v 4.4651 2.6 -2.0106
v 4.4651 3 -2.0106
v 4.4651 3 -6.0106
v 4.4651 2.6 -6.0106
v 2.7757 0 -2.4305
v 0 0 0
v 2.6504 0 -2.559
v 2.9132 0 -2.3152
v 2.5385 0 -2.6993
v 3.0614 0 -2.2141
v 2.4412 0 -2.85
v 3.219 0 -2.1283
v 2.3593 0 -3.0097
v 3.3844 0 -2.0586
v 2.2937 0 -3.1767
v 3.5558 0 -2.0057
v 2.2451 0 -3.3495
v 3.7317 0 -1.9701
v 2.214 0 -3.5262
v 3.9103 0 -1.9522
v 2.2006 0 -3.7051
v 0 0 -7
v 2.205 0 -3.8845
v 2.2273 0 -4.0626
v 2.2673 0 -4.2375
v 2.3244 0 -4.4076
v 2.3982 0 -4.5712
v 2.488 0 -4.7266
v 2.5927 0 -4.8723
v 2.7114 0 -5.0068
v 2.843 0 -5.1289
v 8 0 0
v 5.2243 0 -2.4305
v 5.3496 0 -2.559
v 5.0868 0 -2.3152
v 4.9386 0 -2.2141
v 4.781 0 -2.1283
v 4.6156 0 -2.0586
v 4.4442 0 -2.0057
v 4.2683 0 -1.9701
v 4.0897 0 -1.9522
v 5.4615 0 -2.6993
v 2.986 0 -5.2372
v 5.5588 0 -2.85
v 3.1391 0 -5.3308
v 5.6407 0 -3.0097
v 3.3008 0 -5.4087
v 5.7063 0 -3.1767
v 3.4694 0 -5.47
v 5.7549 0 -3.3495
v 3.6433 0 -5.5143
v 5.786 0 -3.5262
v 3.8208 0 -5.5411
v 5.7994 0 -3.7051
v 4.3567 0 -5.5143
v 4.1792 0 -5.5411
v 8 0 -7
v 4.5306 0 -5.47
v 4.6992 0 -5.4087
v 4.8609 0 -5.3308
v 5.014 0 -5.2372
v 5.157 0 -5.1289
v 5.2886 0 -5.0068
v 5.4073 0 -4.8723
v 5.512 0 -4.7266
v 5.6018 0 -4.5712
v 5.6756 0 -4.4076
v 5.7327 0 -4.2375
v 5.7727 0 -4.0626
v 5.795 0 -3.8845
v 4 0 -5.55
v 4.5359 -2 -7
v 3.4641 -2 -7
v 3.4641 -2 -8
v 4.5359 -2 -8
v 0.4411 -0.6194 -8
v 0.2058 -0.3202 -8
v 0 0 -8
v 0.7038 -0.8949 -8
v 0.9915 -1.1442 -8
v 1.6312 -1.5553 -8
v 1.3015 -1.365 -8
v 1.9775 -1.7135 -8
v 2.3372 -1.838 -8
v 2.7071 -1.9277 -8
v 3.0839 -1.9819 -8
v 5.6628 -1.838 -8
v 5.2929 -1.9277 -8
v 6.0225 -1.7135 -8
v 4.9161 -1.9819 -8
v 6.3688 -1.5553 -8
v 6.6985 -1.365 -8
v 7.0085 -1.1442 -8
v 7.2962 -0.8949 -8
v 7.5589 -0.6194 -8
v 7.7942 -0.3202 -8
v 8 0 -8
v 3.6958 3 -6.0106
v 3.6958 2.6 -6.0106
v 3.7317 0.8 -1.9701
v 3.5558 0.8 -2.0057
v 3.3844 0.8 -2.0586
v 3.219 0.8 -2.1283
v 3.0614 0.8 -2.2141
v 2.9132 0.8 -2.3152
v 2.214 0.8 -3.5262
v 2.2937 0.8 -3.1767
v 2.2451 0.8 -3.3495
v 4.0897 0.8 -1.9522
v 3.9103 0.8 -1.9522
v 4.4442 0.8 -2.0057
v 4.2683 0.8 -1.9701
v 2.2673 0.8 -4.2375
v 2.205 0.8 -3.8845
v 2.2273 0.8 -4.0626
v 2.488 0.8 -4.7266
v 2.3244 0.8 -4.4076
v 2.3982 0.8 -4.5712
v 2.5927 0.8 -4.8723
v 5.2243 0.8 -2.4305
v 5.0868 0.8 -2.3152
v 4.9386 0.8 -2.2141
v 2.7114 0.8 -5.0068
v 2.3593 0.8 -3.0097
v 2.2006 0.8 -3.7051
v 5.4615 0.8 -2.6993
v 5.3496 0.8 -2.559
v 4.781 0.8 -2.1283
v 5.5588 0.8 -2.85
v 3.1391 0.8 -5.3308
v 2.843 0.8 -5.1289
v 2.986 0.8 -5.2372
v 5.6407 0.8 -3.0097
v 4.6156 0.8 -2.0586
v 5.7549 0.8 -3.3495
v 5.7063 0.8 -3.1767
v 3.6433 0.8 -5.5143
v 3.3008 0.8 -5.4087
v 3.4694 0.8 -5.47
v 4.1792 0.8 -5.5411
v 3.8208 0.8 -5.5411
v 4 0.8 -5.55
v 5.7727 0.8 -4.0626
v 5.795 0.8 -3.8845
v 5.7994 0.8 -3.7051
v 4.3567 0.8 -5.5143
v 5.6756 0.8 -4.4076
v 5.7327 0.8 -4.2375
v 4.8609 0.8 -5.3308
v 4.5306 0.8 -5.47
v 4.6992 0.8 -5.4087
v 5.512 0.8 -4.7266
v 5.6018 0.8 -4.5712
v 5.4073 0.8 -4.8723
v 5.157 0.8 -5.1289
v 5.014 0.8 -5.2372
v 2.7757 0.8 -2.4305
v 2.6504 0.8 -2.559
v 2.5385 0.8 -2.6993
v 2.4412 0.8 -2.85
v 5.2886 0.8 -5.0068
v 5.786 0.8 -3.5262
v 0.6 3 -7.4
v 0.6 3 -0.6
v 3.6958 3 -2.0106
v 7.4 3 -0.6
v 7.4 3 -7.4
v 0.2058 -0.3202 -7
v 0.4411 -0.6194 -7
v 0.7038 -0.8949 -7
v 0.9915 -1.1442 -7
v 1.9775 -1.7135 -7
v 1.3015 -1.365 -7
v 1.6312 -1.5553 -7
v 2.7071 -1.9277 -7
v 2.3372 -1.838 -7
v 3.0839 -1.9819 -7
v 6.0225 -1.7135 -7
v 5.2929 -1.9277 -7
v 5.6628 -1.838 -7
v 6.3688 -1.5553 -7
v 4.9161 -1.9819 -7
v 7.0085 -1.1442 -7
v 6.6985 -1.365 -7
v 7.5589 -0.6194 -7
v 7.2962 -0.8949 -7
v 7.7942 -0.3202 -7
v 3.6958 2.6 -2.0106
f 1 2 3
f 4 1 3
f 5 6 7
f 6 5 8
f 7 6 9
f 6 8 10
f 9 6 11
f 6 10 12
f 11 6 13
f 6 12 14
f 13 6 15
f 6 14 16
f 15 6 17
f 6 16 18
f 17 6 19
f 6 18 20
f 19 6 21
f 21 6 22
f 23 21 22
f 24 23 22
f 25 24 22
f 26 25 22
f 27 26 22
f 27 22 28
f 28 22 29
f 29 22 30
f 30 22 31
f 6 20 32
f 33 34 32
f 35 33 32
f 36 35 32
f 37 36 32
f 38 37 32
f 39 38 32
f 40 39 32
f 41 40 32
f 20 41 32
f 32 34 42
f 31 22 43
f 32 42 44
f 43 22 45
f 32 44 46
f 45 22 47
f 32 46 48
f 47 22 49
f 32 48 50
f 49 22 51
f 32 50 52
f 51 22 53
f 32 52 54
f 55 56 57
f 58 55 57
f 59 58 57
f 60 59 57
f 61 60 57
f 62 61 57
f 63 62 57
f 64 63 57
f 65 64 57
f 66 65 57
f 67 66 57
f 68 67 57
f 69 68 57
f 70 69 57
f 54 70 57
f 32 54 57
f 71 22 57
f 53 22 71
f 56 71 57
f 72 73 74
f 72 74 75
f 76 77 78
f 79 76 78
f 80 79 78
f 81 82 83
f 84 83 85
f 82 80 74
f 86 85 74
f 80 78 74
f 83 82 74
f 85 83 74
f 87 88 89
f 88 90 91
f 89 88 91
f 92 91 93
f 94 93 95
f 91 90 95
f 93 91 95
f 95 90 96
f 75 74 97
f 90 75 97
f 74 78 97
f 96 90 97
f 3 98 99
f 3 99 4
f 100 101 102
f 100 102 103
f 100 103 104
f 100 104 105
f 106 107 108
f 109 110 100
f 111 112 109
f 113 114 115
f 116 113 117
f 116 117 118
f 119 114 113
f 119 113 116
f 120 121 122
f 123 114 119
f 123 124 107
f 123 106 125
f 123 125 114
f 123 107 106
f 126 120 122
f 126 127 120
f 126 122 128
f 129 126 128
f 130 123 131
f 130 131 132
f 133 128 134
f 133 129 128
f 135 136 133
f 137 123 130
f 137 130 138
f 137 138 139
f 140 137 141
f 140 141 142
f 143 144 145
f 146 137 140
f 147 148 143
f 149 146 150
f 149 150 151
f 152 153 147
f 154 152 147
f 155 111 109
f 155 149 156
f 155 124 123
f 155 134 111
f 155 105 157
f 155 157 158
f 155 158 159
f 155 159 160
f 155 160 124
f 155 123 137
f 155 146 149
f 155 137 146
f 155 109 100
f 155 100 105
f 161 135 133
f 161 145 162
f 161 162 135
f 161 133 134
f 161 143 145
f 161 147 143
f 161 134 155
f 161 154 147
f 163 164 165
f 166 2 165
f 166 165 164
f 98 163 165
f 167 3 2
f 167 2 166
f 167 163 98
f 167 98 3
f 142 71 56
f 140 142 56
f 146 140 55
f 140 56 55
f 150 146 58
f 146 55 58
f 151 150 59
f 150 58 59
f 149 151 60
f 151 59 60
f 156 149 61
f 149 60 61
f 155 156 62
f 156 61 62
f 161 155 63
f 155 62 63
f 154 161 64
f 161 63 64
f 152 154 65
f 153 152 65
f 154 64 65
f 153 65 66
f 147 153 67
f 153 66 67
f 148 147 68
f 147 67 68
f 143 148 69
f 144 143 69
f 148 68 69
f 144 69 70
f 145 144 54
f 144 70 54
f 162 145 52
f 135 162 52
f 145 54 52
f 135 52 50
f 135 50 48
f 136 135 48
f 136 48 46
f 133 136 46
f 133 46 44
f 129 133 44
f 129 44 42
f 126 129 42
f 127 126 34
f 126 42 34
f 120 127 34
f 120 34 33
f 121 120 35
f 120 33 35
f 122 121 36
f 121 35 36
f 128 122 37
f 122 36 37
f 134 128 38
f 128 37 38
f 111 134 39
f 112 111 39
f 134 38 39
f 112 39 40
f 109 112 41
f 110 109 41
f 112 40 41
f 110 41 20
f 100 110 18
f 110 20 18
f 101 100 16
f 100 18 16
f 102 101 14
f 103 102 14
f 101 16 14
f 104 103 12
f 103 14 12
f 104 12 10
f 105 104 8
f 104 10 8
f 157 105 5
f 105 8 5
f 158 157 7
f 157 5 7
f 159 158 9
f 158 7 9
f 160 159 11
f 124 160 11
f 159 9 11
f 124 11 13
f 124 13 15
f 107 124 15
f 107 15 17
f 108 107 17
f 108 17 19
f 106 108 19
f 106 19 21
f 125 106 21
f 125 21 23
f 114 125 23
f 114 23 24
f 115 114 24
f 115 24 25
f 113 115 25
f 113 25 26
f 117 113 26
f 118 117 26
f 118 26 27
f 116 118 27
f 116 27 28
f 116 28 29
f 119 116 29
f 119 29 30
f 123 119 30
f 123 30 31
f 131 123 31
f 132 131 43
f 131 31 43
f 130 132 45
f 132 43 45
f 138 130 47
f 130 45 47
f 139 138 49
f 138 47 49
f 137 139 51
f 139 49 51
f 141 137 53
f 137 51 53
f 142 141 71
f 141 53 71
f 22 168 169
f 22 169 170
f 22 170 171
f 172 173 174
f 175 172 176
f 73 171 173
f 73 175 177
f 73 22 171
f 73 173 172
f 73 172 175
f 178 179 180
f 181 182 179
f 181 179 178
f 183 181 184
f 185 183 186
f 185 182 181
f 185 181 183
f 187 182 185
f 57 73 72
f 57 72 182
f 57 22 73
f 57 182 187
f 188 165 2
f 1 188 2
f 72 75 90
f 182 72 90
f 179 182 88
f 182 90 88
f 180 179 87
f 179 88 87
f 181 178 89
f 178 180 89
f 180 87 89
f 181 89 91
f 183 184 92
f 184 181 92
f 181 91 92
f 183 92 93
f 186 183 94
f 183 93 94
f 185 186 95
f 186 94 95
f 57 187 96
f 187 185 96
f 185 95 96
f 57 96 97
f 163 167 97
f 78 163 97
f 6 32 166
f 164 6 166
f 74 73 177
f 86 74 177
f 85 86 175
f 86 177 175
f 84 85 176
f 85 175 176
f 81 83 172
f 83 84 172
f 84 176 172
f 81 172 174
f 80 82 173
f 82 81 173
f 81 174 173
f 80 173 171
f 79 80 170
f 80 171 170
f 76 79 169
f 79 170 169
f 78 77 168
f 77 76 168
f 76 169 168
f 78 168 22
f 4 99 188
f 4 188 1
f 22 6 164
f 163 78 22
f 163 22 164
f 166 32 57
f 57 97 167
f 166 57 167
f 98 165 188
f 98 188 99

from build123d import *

# Parameters (mm, degrees)
SKETCH1_W               = 8
SKETCH1_H               = 8
BOSS_EXTRUDE1_DEPTH     = 3
CUT_EXTRUDE1_DEPTH      = 12.704699911
CUT_EXTRUDE1_DEPTH_BACK = 12.704699911
CUT_EXTRUDE2_DEPTH      = 11
SKETCH4_R               = 1.8
CUT_EXTRUDE3_DEPTH      = 0.8
SKETCH5_W               = 8
SKETCH5_H               = 1
BOSS_EXTRUDE2_DEPTH     = 2
FILLET1_R               = 4
SKETCH6_W               = 0.769230769
SKETCH6_H               = 4
CUT_EXTRUDE4_DEPTH      = 0.4


with BuildPart() as part:
    # Sketch1 → Boss-Extrude1 (new body)
    with BuildSketch(Plane(origin=(0, 0, 0), x_dir=(1, 0, 0), z_dir=(0, 1, 0))):
        with Locations((4, 4)):
            Rectangle(SKETCH1_W, SKETCH1_H)
    extrude(amount=BOSS_EXTRUDE1_DEPTH)

    # Sketch2 → Cut-Extrude1 (cut, two sides: drawn at the far end of the back side and taken through both)
    with BuildSketch(Plane.XY.offset(-CUT_EXTRUDE1_DEPTH_BACK)):
        Polygon((0, 0), (0.6, 3), (0, 3), align=None)
        Polygon((8, 0), (7.4, 3), (8, 3), align=None)
    extrude(amount=CUT_EXTRUDE1_DEPTH + CUT_EXTRUDE1_DEPTH_BACK, mode=Mode.SUBTRACT)

    # Sketch3 → Cut-Extrude2 (cut)
    with BuildSketch(Plane(origin=(0, 0, 0), x_dir=(0, 0, -1), z_dir=(1, 0, 0))):
        Polygon((0, 0), (0.6, 3), (0, 3), align=None)
        Polygon((8, 3), (7.4, 3), (8, 0), align=None)
    extrude(amount=CUT_EXTRUDE2_DEPTH, mode=Mode.SUBTRACT)

    # Sketch4 → Cut-Extrude3 (cut)
    with BuildSketch(Plane.XZ):
        with Locations(Location((4, -3.75, 0), (0, 0, 270))):
            Circle(SKETCH4_R)
    extrude(amount=-CUT_EXTRUDE3_DEPTH, mode=Mode.SUBTRACT)

    # Sketch5 → Boss-Extrude2 (add)
    with BuildSketch(Plane.XZ):
        with Locations((4, -7.5)):
            Rectangle(SKETCH5_W, SKETCH5_H)
    extrude(amount=BOSS_EXTRUDE2_DEPTH)

    # Fillet1
    # the kernel refuses this fillet: 4 mm, written as the material it takes off along each edge
    with BuildSketch(Plane(origin=(8, -2, -16.660254038), x_dir=(0, 1, 0), z_dir=(0, 0, 1)), Plane(origin=(0, -2, 1.660254038), x_dir=(0, 1, 0), z_dir=(0, 0, -1))) as fillet1_piece_1:
        with BuildLine():
            CenterArc((4, 3.464101615), FILLET1_R, 180, 60)
            Line((0, 3.464101615), (-0.08, 3.464101615))
            Line((-0.08, 3.464101615), (-0.08, 0))
            Line((-0.08, 0), (0, -0.08))
            ThreePointArc((0, -0.08), (1, -0.08), (1.96, -0.069282032))
            Line((1.96, -0.069282032), (2, 0))
        make_face()
    extrude(amount=18.320508076, mode=Mode.SUBTRACT)

    # Sketch6 → Cut-Extrude4 (cut)
    with BuildSketch(Plane(origin=(0, 3, 0), x_dir=(1, 0, 0), z_dir=(0, 1, 0))):
        with Locations((4.080454652, 4.010567225)):
            Rectangle(SKETCH6_W, SKETCH6_H)
    extrude(amount=-CUT_EXTRUDE4_DEPTH, mode=Mode.SUBTRACT)


solid = part.part
